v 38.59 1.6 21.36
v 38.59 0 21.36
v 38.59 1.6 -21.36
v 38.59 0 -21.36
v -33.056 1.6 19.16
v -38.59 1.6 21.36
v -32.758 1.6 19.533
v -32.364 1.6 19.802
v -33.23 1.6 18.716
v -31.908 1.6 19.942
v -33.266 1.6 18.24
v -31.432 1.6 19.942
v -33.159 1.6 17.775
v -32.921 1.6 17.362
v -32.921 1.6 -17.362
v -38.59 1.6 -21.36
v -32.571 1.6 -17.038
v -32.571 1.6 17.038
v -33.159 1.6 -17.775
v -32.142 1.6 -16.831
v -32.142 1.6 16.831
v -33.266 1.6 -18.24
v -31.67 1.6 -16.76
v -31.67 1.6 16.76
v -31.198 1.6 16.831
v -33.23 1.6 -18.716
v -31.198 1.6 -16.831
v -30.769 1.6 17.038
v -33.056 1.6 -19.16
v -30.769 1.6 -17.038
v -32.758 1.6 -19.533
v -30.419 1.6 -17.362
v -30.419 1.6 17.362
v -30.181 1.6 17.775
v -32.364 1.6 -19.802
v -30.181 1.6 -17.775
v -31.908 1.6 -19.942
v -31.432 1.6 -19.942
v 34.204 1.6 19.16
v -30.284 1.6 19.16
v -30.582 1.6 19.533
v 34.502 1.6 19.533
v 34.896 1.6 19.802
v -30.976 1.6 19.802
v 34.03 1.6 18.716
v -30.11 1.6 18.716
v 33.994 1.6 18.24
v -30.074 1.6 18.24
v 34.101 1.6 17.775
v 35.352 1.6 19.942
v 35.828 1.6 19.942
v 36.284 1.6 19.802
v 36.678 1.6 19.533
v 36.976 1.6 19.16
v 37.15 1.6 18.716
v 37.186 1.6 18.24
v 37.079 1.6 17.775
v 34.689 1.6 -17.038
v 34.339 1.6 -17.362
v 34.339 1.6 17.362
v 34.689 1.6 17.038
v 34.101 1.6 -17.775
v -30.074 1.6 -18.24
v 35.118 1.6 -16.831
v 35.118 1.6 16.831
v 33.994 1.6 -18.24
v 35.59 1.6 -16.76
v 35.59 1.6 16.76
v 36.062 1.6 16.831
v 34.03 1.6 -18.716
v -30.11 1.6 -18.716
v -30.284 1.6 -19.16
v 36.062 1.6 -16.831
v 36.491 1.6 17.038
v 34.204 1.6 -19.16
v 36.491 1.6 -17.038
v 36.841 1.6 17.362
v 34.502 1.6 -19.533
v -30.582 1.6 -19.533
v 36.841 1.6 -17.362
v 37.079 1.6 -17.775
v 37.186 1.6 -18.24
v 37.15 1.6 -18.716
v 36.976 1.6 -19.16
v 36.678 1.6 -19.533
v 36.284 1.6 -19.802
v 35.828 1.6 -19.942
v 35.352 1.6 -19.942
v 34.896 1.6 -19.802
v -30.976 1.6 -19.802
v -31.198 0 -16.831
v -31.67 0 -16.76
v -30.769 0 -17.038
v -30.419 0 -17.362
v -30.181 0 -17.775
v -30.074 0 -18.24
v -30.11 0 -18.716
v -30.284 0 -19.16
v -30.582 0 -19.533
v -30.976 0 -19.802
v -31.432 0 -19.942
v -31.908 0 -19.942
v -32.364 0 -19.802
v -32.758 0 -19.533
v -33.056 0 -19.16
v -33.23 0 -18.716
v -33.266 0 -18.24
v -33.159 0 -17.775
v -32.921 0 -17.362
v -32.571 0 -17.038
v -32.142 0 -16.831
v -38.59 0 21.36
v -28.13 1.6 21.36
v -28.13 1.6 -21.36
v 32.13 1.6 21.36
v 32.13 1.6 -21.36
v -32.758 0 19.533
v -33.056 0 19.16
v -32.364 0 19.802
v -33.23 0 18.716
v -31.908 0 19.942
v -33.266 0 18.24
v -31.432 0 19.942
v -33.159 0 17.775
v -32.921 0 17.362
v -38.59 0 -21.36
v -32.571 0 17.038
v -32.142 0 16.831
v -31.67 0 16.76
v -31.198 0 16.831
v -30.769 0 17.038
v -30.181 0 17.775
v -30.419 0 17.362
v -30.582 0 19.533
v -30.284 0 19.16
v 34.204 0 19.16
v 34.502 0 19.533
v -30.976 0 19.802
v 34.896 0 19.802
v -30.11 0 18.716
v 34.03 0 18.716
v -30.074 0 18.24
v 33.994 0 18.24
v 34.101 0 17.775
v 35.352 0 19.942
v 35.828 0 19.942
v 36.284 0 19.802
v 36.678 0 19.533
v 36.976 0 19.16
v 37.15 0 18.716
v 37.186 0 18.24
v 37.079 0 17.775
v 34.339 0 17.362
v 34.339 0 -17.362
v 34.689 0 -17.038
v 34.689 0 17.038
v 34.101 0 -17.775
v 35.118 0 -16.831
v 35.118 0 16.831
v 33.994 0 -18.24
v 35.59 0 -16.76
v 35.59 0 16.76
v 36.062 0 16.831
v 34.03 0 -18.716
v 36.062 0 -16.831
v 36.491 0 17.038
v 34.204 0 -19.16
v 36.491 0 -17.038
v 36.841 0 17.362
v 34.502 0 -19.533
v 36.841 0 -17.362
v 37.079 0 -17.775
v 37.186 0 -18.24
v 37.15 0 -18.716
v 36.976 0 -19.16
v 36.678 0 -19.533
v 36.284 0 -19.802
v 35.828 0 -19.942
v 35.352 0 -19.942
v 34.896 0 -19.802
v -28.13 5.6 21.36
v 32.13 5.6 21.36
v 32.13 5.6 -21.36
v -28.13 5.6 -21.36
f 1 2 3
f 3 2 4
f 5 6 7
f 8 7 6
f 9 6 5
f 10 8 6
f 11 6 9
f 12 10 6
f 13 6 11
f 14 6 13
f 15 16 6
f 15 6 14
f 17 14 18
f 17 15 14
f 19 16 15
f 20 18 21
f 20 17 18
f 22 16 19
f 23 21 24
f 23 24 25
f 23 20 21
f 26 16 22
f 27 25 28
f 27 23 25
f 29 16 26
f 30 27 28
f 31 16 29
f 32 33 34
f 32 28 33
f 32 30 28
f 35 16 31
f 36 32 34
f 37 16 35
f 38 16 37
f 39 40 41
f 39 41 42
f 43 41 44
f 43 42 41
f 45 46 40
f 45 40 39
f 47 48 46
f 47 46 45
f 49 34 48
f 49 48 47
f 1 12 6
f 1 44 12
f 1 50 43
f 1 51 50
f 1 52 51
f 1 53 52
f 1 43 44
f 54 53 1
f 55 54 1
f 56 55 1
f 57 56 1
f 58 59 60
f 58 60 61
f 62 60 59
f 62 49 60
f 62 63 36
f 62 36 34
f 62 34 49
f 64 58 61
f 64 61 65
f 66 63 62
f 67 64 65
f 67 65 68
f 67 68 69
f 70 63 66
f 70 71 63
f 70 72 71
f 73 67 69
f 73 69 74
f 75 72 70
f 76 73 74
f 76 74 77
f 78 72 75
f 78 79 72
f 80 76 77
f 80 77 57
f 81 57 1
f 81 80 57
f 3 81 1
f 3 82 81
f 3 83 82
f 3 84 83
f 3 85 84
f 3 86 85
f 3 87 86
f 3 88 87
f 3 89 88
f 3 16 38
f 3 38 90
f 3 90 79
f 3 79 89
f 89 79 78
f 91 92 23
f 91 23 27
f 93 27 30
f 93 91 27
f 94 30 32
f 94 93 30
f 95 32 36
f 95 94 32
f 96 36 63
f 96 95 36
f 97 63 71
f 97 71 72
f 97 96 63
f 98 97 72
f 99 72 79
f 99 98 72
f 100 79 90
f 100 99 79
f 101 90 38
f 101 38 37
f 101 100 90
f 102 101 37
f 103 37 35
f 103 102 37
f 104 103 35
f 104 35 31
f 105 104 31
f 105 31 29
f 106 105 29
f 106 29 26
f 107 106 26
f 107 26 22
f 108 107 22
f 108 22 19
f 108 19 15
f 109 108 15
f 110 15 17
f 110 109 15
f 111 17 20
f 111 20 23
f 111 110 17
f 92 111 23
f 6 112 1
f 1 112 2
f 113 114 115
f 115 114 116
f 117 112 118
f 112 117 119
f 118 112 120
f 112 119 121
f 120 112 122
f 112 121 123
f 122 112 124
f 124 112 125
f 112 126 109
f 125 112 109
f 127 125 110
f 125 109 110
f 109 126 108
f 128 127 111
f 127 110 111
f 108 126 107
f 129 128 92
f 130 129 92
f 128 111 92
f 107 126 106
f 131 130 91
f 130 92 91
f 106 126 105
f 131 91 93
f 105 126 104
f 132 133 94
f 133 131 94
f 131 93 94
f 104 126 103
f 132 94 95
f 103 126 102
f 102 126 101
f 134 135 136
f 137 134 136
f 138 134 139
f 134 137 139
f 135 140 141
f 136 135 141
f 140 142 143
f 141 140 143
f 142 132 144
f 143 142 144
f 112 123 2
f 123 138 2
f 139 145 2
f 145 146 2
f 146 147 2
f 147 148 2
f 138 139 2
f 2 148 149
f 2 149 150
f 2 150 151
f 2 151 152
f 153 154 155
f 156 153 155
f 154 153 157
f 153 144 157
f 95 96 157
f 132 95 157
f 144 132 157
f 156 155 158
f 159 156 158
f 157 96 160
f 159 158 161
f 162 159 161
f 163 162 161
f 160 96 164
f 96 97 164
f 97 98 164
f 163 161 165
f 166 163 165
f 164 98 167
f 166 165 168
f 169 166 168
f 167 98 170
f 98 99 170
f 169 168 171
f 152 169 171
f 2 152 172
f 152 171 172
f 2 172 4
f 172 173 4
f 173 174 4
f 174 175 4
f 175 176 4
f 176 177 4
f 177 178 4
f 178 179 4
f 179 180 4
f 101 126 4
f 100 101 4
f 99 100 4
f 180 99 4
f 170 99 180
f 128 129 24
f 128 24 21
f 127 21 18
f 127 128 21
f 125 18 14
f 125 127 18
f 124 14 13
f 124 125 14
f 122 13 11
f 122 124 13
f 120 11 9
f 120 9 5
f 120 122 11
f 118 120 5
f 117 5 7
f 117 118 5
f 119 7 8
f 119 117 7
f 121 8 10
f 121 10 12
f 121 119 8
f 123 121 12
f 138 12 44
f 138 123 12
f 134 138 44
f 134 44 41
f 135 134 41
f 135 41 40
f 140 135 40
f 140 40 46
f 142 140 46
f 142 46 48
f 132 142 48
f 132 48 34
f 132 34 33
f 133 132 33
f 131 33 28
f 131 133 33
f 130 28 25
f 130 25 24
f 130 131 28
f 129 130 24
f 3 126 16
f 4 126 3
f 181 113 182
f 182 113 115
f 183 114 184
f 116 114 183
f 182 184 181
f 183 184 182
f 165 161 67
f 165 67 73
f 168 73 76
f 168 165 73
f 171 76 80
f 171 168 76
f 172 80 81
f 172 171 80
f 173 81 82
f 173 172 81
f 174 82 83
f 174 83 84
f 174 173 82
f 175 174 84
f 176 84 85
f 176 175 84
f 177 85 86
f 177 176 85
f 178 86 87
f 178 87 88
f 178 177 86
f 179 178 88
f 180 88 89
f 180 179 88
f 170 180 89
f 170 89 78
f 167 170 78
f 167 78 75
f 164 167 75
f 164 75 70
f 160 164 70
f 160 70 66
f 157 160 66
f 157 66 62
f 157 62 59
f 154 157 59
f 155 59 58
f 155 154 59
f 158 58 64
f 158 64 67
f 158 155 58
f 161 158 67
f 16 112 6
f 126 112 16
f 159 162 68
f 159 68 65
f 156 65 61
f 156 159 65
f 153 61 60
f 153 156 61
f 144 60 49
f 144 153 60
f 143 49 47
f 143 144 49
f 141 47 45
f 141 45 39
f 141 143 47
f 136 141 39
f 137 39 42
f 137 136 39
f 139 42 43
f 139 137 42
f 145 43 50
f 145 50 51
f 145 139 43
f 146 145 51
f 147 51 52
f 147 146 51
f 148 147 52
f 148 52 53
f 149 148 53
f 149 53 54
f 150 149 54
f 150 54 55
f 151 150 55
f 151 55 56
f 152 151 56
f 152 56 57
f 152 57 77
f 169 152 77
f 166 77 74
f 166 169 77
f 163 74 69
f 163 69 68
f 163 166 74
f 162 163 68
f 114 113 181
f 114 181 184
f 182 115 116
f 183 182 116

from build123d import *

# Parameters (mm, degrees)
SZKIC1_W                    = 77.18
SZKIC1_H                    = 42.72
SZKIC1_R                    = 1.6
DODANIE_WYCI_GNI_CIE1_DEPTH = 1.6
SZKIC2_W                    = 60.26
SZKIC2_H                    = 42.72
DODANIE_WYCI_GNI_CIE2_DEPTH = 4


with BuildPart() as part:
    # Szkic1 → Dodanie-wyciągnięcie1 (new body)
    with BuildSketch(Plane(origin=(0, 0, 0), x_dir=(1, 0, 0), z_dir=(0, 1, 0))):
        Rectangle(SZKIC1_W, SZKIC1_H)
        with Locations(Location((-31.67, 18.36, 0), (0, 0, 270))):
            Circle(SZKIC1_R, mode=Mode.SUBTRACT)
        with Locations(Location((35.59, 18.36, 0), (0, 0, 270))):
            Circle(SZKIC1_R, mode=Mode.SUBTRACT)
        with Locations(Location((35.59, -18.36, 0), (0, 0, 90))):
            Circle(SZKIC1_R, mode=Mode.SUBTRACT)
        with Locations(Location((-31.67, -18.36, 0), (0, 0, 90))):
            Circle(SZKIC1_R, mode=Mode.SUBTRACT)
    extrude(amount=DODANIE_WYCI_GNI_CIE1_DEPTH)


with BuildPart() as body_2:
    # Szkic2 → Dodanie-wyciągnięcie2 (new body)
    with BuildSketch(Plane(origin=(0, 1.6, 0), x_dir=(1, 0, 0), z_dir=(0, 1, 0))):
        with Locations((2, 0)):
            Rectangle(SZKIC2_W, SZKIC2_H)
    extrude(amount=DODANIE_WYCI_GNI_CIE2_DEPTH)


solid = Compound([part.part, body_2.part])
